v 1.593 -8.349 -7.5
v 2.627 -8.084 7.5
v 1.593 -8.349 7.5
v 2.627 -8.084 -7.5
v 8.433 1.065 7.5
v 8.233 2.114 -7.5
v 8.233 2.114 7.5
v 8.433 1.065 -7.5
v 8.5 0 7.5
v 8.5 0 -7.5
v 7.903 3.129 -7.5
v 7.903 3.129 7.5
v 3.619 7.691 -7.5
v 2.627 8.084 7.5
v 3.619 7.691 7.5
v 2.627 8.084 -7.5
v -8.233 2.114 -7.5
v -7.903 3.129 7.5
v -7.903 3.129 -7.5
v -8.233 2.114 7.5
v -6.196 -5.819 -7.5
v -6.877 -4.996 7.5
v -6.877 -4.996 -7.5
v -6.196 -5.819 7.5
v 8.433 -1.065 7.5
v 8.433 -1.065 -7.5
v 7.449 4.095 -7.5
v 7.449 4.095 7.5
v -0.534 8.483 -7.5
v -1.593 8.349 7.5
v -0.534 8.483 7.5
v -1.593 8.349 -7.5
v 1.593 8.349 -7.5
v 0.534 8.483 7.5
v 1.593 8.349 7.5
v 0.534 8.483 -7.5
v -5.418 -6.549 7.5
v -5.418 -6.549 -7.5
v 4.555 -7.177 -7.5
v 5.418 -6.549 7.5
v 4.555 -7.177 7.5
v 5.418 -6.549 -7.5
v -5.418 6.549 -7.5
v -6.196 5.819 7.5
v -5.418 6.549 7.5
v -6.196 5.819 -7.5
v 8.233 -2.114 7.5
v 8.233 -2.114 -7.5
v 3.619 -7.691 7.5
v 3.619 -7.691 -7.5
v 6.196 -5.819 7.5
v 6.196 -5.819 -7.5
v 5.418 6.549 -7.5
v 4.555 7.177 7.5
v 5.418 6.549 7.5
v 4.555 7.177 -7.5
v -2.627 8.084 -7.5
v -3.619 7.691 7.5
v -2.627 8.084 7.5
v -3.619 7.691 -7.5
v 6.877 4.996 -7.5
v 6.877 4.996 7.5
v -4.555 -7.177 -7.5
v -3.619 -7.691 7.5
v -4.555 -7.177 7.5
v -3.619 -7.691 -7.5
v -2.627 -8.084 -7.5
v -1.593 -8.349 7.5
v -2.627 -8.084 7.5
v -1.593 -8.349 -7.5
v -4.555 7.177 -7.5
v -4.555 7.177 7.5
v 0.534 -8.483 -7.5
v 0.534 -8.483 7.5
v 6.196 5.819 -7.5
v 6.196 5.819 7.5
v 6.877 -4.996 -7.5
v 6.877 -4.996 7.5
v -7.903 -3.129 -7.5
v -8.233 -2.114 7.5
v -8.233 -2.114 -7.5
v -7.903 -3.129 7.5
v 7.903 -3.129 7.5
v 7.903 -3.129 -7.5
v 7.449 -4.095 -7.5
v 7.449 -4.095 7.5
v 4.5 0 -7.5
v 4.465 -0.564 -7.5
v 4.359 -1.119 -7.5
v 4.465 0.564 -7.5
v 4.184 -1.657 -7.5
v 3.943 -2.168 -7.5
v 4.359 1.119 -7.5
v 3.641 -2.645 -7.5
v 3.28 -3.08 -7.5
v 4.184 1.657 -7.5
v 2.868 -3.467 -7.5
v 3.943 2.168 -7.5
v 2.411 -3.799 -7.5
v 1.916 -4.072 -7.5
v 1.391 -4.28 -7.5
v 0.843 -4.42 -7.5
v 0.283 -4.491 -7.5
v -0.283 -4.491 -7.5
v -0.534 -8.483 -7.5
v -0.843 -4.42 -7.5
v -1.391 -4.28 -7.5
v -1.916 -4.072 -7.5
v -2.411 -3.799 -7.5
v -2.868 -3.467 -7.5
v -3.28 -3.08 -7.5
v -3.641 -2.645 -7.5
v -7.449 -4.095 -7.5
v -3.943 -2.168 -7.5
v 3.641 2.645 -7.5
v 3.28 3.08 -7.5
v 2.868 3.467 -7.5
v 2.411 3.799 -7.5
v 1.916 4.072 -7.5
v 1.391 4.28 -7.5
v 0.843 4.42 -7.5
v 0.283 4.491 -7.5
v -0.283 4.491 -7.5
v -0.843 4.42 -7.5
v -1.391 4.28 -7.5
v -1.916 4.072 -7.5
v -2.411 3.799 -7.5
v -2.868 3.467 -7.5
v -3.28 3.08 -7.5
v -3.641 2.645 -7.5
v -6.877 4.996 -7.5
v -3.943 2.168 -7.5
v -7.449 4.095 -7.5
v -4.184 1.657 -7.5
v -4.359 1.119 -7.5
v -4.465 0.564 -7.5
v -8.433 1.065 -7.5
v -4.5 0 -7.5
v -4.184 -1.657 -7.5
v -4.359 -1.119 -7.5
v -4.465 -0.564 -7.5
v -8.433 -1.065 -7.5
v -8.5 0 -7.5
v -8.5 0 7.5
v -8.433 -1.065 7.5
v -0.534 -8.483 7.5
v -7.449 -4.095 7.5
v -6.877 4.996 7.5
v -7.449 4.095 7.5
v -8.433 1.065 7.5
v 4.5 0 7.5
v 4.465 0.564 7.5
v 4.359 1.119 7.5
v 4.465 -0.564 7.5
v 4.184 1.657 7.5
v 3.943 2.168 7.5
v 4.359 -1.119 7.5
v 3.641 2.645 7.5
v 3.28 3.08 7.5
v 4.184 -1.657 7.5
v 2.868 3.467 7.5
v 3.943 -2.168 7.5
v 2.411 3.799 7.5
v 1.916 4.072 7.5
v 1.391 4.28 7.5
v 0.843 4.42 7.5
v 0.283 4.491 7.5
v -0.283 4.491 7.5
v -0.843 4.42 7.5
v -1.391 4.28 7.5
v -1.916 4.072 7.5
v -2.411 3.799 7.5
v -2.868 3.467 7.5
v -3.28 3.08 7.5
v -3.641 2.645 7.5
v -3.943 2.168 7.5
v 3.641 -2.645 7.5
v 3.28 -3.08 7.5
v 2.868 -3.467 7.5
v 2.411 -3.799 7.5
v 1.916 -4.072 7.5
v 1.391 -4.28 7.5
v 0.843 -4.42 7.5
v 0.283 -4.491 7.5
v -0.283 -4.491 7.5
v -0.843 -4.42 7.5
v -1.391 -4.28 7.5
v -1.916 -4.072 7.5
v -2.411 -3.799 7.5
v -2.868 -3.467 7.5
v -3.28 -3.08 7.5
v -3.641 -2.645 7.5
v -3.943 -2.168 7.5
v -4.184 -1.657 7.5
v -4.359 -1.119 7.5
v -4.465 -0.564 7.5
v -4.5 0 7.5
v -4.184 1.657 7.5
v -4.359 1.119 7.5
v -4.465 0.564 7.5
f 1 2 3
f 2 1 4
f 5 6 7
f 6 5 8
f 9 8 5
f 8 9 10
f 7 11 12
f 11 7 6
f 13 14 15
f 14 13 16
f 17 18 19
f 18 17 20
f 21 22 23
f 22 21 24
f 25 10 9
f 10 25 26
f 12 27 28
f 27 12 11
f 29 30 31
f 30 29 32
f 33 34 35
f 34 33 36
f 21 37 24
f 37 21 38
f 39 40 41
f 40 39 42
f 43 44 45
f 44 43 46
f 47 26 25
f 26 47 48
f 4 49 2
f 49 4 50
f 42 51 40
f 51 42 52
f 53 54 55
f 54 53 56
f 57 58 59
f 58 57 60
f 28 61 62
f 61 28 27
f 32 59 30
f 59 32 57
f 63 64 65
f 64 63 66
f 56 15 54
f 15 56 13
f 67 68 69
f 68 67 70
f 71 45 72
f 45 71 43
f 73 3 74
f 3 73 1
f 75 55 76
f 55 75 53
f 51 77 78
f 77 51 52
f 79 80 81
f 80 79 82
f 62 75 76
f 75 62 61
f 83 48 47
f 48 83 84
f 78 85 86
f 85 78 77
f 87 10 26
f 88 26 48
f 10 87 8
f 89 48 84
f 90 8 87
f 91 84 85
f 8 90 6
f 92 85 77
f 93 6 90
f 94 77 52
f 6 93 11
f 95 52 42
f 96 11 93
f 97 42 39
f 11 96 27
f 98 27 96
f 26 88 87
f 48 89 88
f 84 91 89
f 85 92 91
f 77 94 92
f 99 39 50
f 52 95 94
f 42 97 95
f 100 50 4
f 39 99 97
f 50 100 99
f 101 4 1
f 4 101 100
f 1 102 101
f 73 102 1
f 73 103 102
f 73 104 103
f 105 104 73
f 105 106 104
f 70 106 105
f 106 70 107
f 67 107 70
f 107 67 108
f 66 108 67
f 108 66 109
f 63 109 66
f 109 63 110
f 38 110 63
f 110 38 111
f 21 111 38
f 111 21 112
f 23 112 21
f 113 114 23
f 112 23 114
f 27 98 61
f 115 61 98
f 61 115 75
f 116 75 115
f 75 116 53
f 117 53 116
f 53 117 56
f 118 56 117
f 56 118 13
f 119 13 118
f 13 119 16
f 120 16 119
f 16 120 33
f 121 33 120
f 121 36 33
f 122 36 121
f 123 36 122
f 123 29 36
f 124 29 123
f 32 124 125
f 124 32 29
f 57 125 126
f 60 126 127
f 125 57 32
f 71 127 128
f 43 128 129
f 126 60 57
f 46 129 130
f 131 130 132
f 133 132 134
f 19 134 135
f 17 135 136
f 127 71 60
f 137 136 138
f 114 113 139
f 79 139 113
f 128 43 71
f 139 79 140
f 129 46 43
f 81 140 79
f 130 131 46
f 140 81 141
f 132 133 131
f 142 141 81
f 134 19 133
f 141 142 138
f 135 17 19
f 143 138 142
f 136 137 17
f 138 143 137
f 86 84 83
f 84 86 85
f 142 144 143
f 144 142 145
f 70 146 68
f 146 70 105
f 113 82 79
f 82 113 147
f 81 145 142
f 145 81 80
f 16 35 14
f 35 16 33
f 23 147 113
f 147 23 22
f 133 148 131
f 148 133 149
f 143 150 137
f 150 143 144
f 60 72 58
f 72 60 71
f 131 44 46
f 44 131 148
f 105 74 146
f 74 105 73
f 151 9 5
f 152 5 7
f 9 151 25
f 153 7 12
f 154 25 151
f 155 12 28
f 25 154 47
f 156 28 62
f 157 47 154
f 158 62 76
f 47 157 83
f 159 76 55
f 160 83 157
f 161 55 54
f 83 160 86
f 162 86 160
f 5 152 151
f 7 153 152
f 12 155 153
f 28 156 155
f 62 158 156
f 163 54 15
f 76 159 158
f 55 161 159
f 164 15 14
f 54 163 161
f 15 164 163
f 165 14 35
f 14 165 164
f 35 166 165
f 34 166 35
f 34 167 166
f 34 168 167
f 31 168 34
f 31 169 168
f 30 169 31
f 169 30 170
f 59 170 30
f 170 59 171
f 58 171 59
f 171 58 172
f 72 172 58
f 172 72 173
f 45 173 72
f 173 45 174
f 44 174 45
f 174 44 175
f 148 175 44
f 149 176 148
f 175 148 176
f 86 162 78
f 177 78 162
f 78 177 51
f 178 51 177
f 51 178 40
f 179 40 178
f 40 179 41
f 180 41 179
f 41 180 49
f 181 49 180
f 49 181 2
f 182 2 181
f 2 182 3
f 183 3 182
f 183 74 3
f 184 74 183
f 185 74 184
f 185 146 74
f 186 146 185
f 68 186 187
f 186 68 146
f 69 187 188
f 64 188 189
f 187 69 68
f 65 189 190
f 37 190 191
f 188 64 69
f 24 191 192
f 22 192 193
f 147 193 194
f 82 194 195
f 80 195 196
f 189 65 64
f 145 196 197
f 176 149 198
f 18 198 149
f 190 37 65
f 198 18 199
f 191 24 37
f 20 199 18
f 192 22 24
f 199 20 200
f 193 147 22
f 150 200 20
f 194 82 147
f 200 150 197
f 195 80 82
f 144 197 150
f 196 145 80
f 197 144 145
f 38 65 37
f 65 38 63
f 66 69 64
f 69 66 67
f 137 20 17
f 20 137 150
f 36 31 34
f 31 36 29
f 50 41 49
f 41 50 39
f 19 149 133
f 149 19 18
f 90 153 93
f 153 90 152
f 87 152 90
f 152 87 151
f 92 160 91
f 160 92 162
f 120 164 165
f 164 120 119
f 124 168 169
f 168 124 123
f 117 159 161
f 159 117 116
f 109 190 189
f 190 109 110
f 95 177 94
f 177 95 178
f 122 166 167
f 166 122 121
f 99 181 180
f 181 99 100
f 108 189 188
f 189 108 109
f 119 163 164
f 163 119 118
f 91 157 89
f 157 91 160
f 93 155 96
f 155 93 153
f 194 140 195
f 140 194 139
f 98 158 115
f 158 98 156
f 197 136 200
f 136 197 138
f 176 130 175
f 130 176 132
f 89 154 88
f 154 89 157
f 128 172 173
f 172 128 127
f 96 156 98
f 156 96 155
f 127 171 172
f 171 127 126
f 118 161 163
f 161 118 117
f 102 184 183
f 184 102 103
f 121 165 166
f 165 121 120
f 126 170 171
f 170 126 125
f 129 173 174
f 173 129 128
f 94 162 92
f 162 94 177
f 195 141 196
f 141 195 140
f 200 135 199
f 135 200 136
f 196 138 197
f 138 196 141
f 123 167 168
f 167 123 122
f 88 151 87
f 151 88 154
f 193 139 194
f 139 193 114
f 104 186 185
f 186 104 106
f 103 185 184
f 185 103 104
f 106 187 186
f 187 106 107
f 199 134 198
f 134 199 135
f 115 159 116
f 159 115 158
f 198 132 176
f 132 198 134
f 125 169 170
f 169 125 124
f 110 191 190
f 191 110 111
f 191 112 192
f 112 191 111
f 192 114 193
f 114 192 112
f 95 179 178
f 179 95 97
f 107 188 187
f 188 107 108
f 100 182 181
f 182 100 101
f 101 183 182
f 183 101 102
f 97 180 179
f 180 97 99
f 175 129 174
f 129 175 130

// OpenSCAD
$fn = 50;


difference() {
	union() {
		translate(v = [0, 0, -7.5000000000]) {
			cylinder(h = 15, r = 8.5000000000);
		}
	}
	union() {
		translate(v = [0, 0, -100.0000000000]) {
			cylinder(h = 200, r = 4.5000000000);
		}
	}
}
